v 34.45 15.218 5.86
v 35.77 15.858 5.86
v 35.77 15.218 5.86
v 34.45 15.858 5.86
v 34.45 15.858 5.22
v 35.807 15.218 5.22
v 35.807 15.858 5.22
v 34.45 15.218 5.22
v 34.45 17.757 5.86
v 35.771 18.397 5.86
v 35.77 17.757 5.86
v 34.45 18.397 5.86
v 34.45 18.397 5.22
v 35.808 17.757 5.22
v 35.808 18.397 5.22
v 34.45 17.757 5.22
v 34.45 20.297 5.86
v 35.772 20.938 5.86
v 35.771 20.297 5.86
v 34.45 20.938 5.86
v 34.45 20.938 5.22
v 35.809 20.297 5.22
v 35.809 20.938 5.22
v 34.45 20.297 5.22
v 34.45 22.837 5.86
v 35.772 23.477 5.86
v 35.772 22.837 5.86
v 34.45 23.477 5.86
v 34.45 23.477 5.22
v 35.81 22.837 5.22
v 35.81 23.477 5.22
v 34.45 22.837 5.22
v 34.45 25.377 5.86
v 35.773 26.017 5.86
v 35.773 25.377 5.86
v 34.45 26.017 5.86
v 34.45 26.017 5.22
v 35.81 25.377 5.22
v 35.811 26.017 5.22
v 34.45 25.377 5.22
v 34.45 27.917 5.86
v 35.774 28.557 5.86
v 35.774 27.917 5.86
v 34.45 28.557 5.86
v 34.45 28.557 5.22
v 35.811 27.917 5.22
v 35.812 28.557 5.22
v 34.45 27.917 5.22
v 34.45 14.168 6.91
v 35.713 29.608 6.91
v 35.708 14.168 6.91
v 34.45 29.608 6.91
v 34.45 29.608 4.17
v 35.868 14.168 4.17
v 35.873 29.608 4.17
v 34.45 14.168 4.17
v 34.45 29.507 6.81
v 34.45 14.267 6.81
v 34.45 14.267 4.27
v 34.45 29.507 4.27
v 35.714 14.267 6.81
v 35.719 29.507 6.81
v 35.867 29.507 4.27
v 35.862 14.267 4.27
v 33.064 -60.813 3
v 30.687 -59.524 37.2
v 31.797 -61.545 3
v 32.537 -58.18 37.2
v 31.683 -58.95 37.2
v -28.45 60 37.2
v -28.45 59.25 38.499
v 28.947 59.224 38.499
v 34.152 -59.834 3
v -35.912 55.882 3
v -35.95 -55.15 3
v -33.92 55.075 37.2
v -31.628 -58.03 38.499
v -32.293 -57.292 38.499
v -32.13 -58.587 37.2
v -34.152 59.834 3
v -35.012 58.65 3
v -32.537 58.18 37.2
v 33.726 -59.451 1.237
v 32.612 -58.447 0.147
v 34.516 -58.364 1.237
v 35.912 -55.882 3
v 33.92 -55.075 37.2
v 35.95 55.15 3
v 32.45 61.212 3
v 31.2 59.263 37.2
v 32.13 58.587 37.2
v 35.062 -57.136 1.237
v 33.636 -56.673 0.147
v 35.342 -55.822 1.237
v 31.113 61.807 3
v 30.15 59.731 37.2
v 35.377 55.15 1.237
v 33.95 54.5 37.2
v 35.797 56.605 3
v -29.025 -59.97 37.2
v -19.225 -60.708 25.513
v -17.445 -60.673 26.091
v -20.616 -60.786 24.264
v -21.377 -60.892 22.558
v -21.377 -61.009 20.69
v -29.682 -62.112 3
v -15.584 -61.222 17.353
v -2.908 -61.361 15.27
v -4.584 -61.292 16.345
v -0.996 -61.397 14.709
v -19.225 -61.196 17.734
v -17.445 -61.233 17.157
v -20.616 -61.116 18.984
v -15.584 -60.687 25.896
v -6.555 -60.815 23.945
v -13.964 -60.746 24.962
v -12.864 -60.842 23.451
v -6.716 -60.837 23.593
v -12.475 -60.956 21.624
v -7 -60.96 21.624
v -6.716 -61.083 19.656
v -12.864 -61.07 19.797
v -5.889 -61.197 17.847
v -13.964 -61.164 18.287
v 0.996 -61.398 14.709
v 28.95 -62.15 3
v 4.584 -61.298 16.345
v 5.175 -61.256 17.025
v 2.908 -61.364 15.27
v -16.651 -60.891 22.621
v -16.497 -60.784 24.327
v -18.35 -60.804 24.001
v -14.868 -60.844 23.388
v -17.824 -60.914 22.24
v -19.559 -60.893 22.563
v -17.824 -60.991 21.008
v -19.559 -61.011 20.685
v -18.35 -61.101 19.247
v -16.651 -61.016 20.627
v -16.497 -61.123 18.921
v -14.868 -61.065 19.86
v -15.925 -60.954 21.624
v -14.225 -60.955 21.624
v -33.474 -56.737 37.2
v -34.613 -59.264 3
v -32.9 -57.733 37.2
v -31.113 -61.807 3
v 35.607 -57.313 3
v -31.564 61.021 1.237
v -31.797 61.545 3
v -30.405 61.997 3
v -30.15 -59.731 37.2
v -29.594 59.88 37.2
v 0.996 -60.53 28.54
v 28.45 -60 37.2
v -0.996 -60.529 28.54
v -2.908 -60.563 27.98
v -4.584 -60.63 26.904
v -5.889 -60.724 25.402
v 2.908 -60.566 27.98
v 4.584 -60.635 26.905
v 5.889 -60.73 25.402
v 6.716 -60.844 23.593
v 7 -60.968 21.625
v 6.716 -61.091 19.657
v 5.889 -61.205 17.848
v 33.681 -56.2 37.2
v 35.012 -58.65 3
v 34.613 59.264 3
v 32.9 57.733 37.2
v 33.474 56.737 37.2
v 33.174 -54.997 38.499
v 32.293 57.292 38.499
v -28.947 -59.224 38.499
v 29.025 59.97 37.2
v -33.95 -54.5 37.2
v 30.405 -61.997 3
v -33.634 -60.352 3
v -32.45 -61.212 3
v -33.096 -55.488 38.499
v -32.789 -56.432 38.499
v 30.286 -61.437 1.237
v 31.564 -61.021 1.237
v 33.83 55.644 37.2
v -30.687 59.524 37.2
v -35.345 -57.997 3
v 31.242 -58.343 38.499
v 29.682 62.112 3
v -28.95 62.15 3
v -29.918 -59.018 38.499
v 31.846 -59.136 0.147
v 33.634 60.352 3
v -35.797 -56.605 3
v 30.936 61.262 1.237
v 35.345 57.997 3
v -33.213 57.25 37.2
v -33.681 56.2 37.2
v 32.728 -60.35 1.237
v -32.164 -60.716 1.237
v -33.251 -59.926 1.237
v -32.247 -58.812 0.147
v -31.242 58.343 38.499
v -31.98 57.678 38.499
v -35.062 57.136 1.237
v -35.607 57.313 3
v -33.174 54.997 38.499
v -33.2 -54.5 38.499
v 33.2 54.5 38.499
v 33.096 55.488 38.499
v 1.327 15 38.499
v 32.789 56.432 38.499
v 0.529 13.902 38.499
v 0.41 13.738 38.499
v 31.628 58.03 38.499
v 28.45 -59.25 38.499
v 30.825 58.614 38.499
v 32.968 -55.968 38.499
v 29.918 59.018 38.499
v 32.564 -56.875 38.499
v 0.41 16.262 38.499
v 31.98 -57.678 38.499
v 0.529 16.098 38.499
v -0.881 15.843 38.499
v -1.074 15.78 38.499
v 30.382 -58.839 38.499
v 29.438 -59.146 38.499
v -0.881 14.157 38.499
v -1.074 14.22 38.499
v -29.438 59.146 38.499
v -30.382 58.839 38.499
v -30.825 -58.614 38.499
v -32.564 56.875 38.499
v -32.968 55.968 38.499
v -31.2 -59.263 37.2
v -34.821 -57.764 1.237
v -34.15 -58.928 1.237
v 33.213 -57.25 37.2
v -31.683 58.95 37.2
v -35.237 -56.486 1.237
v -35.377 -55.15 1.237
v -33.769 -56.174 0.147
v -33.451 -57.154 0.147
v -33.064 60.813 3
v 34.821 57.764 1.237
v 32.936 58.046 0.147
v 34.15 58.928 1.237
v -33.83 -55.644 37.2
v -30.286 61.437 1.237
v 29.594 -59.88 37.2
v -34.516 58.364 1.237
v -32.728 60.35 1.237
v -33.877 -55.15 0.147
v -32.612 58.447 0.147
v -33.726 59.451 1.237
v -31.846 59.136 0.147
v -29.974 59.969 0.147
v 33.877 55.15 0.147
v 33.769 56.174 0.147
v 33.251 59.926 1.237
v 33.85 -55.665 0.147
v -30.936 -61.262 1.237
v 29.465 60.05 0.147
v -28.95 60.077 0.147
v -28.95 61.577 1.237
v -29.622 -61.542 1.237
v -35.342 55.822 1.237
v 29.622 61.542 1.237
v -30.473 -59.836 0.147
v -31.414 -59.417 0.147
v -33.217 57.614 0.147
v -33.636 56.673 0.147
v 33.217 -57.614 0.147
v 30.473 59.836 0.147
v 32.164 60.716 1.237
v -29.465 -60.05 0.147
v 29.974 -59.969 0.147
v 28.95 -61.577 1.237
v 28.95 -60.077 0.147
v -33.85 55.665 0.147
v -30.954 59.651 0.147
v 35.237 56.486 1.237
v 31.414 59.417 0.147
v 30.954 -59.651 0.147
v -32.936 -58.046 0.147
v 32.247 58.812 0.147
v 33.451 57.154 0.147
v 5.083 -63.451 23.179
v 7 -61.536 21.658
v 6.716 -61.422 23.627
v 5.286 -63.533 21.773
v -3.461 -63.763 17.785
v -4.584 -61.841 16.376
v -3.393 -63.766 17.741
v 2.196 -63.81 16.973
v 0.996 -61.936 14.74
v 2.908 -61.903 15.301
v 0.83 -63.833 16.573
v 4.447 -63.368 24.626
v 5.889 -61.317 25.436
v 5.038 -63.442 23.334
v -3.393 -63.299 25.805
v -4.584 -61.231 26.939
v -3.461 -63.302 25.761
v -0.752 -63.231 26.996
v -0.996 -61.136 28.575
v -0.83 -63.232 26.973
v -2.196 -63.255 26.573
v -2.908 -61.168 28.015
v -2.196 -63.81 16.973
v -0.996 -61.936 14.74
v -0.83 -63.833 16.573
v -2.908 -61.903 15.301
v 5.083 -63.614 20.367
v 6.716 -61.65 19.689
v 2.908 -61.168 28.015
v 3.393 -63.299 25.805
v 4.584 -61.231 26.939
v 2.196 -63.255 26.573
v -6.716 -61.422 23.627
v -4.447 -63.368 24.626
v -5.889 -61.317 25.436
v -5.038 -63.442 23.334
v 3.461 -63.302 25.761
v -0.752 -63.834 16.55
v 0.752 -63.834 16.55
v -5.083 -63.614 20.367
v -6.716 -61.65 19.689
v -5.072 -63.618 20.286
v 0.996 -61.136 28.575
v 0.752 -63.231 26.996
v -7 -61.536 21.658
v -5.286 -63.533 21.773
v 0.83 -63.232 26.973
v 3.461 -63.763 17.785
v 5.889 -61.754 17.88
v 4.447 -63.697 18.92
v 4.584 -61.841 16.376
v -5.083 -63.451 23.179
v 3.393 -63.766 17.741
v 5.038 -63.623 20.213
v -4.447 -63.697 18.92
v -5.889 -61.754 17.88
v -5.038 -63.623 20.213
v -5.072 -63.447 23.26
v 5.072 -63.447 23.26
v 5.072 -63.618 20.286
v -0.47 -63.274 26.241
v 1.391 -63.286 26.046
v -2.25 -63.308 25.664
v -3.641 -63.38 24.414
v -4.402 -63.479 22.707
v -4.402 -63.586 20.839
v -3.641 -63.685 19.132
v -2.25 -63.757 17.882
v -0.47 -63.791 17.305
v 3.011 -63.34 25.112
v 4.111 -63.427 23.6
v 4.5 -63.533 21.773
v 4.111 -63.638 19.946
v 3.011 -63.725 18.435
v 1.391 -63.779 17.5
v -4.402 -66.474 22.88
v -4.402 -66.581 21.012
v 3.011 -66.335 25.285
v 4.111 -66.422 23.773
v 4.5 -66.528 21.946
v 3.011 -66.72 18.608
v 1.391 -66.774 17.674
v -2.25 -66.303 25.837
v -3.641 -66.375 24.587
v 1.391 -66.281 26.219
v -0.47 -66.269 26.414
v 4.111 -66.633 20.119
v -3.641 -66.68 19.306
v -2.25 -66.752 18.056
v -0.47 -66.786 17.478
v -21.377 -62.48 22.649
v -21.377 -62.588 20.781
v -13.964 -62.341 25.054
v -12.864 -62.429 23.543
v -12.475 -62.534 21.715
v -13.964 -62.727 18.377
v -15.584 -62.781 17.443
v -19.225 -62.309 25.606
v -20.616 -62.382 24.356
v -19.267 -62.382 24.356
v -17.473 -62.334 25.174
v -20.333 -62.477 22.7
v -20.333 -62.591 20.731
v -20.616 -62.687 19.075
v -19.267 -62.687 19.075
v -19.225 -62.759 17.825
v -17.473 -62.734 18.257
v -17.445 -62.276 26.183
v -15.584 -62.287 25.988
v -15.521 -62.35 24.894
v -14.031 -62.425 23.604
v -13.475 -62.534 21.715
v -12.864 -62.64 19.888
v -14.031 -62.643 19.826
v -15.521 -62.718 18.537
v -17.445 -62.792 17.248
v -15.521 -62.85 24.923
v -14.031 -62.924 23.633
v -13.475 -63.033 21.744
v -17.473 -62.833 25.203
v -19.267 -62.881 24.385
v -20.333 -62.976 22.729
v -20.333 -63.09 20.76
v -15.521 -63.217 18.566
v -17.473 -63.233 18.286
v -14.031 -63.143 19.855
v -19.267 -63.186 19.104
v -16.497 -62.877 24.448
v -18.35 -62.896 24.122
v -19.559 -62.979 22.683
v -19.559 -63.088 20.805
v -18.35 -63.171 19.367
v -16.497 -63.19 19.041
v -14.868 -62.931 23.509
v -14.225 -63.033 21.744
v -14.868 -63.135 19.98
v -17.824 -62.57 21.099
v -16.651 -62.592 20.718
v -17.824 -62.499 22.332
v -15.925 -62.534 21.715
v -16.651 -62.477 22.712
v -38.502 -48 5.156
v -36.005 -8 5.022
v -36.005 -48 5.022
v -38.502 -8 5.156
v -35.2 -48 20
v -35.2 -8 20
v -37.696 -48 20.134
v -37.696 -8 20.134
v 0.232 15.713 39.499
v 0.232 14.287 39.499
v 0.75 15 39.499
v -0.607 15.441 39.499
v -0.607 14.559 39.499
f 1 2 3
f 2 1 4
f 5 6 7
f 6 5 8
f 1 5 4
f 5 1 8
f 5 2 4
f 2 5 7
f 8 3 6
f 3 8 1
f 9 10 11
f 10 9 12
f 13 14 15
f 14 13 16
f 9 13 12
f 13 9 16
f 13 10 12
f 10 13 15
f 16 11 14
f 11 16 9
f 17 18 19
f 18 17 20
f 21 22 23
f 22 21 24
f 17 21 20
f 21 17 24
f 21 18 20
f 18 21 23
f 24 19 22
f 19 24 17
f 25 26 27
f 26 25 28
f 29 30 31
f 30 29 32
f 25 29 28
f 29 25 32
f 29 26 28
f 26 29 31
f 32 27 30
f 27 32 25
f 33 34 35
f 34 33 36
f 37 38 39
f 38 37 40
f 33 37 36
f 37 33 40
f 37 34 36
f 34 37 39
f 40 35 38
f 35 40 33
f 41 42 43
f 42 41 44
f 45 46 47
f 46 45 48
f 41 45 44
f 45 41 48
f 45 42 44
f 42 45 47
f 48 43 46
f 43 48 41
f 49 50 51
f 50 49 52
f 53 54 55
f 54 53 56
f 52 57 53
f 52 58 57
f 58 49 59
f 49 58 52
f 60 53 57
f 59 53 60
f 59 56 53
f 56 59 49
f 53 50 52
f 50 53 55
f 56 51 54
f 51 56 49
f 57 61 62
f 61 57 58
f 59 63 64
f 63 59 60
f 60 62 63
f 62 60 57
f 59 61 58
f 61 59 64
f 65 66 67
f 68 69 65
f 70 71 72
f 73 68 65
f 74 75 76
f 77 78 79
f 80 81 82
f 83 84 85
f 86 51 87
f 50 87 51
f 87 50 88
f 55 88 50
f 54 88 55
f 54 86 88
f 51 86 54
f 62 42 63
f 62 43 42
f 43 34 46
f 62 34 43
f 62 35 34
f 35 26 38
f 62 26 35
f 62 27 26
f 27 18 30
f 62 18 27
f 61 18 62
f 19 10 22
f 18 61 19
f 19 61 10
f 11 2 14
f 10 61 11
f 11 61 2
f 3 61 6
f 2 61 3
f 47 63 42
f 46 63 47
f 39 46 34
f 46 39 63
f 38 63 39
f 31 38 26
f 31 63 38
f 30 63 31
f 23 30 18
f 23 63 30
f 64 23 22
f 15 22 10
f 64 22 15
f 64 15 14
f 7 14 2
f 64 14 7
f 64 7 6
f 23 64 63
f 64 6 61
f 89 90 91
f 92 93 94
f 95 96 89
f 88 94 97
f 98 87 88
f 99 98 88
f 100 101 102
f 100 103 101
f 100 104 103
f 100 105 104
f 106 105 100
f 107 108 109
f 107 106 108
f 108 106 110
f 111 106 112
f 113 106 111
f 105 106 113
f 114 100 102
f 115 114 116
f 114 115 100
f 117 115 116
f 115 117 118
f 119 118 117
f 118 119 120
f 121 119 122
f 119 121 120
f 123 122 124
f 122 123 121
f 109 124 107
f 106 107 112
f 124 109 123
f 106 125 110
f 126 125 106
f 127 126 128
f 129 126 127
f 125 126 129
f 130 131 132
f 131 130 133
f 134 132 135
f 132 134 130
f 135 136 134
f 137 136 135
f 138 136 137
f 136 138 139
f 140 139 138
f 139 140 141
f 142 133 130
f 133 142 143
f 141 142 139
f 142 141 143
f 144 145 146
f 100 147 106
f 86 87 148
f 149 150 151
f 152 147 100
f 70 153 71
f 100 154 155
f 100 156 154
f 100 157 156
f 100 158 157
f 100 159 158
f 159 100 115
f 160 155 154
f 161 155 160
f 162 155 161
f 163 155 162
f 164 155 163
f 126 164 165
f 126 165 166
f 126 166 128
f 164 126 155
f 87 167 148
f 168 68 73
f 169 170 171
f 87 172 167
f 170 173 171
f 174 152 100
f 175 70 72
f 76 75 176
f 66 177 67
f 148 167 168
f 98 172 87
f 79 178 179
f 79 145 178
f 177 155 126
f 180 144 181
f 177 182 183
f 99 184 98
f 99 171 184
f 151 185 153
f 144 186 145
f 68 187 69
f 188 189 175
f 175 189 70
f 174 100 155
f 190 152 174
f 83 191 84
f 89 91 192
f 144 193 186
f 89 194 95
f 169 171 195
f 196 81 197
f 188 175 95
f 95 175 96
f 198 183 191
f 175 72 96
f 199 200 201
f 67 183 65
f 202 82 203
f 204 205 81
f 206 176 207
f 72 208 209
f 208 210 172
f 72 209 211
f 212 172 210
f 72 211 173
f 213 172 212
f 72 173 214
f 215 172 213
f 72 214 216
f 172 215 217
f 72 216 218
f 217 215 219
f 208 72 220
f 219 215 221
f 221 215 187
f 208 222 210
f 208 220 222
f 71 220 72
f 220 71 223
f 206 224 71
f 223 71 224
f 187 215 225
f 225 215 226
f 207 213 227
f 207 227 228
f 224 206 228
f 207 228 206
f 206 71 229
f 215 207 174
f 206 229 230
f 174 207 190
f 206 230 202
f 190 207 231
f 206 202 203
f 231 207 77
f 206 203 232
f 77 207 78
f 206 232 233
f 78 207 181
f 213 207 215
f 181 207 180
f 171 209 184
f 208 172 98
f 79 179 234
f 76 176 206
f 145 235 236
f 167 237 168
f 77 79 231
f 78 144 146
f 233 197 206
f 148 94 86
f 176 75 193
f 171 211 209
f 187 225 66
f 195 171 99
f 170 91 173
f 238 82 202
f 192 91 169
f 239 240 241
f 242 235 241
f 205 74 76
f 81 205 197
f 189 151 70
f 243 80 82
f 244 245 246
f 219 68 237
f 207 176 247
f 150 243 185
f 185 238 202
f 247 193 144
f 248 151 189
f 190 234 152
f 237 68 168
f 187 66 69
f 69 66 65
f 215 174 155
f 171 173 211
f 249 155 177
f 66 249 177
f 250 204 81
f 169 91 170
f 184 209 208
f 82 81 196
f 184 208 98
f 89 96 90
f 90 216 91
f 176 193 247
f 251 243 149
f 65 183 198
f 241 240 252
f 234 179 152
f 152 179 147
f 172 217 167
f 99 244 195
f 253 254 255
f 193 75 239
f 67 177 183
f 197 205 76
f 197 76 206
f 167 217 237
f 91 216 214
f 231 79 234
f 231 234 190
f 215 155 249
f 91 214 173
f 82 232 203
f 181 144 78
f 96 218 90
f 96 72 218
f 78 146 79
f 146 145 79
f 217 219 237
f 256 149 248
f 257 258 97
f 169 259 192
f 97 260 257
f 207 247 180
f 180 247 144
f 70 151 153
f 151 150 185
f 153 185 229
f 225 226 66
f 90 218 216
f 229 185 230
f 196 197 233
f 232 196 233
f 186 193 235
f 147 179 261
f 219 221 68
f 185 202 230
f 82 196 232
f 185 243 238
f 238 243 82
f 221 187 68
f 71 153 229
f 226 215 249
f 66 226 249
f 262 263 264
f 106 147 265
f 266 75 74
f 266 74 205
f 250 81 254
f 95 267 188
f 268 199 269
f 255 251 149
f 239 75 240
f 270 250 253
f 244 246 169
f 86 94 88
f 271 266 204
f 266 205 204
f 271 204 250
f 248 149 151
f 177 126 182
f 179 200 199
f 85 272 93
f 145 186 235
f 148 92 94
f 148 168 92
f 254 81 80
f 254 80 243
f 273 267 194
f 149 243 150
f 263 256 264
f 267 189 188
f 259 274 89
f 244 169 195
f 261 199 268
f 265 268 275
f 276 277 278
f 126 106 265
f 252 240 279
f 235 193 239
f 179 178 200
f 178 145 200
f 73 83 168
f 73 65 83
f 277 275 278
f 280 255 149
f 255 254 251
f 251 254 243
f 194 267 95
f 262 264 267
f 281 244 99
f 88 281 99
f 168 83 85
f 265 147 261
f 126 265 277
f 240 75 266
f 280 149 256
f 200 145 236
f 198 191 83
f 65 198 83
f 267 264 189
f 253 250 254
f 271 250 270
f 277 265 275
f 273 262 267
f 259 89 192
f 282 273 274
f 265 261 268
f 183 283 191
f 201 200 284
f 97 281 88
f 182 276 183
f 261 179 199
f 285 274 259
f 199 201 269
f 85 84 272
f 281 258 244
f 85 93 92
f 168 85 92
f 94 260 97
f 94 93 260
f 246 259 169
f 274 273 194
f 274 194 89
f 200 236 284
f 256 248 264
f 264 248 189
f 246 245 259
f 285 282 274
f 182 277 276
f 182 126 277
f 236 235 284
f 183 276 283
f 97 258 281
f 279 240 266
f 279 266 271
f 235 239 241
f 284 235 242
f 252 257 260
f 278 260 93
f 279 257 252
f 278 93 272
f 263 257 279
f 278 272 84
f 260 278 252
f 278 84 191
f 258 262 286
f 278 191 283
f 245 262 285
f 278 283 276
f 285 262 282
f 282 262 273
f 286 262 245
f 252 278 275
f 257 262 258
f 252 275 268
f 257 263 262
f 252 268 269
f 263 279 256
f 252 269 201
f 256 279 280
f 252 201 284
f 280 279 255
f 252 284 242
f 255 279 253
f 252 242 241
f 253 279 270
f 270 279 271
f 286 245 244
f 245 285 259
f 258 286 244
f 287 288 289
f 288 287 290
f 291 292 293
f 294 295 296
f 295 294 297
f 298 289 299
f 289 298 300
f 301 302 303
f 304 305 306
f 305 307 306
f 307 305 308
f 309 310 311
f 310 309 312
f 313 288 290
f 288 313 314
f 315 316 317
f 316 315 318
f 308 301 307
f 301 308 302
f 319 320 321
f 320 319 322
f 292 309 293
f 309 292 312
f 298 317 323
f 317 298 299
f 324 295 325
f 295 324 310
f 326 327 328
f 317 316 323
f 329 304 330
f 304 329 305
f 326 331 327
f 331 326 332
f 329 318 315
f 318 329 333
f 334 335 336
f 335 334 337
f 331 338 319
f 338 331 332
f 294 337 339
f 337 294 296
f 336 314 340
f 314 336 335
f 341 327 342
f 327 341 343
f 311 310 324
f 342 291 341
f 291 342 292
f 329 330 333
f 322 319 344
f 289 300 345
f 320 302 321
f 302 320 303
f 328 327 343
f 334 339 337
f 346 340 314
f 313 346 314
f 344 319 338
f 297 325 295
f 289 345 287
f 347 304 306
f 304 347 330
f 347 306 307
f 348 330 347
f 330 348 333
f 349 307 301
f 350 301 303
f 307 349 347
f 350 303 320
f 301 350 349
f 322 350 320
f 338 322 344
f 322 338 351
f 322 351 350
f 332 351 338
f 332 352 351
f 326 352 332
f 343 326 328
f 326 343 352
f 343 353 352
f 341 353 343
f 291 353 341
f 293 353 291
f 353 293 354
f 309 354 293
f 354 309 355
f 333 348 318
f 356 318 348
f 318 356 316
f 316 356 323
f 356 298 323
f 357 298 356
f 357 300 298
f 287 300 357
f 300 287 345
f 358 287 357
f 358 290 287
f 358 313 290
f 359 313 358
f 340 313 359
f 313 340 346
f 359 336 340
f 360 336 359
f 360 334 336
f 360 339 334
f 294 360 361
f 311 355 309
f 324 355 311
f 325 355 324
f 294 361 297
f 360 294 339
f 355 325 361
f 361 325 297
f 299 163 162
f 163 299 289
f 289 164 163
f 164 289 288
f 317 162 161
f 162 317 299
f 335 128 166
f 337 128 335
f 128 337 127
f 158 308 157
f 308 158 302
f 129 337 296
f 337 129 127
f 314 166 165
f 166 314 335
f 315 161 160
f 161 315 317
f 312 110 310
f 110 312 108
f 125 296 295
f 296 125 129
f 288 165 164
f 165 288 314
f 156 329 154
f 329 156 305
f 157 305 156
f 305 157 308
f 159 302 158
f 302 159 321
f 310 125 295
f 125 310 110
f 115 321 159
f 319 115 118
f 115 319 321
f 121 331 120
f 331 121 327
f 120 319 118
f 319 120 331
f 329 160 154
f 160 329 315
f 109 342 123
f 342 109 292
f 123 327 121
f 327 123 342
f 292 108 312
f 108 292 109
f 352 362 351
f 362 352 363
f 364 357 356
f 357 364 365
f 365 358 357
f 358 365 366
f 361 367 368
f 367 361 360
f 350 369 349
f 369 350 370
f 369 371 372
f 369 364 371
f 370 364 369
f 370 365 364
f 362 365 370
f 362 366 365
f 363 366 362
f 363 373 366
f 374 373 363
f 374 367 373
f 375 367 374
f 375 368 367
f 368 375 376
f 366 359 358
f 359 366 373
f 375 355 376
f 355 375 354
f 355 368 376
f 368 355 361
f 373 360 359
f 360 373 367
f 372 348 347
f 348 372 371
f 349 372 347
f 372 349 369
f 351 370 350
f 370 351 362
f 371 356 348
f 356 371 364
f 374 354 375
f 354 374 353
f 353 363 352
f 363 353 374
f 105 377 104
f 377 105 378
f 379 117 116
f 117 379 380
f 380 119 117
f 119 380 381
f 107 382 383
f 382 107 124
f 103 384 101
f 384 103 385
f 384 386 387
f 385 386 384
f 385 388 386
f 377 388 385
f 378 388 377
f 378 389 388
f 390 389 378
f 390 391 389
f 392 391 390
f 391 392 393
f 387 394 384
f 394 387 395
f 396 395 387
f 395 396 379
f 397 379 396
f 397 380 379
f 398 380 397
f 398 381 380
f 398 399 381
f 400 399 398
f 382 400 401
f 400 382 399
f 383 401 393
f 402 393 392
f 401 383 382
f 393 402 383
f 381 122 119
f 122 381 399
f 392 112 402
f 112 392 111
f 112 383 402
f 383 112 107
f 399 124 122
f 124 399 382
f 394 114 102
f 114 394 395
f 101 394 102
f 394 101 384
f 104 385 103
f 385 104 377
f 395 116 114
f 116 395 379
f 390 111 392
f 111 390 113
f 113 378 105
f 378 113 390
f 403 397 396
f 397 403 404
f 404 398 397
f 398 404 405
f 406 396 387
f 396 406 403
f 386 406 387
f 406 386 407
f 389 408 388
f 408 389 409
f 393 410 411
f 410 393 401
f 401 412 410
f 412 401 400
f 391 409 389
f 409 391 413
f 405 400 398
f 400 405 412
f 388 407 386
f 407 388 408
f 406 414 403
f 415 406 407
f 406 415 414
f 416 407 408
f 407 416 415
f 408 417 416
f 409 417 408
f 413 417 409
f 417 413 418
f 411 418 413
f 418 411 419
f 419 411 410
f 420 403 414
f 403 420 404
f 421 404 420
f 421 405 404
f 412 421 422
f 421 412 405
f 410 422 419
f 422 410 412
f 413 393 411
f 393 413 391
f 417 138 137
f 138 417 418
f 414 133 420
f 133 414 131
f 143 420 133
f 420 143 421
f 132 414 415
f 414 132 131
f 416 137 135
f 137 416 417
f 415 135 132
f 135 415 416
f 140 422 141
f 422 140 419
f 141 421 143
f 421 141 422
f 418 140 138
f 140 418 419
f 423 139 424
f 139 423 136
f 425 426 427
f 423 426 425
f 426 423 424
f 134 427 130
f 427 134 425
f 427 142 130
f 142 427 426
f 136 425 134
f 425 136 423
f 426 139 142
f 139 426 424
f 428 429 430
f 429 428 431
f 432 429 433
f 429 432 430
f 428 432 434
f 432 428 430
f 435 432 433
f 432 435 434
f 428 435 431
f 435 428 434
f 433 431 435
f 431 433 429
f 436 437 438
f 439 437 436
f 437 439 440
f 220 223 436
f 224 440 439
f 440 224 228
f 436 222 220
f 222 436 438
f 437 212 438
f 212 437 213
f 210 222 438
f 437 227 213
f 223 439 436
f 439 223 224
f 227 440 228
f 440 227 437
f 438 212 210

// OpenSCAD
// Global resolution
//$fs = 0.1;  // Don't generate smaller facets than 0.1 mm
//$fa = 5;    // Don't generate larger angles than 5 degrees

edge_rounding = 1.5;
corner_radius = 4;

bottom_length = 124.3;
bottom_width = 71.9;
top_length = 120;
top_width = 67.9;
height = 37.2;

module corner(rCorner, rEdge) {
    // One corner of the box: a series of spheres rotated from 0° to 90°
    for (angle = [0 : $fa : 90]) {
        rotate(angle) translate([rCorner, 0, 0]) sphere(rEdge);
    }
}

module semiFace(dx, dy, rCorner, rEdge) {
    // Two corners
    translate([dx, dy, 0]) corner(rCorner, rEdge);
    translate([-dx, dy, 0]) rotate([0, 0, 90]) corner(rCorner, rEdge);
}

module face(length, width, rCorner, rEdge) {
    // Four corners with everything in between them.
    dx = width / 2 - rCorner - rEdge;
    dy = length / 2 - rCorner - rEdge;

    hull() {
        semiFace(dx, dy, rCorner, rEdge);
        rotate([0, 0, 180]) semiFace(dx, dy, rCorner, rEdge);
        //cube([dx + dx, dy + dy, 2 * rEdge], center=true);
    }
}

module box_z77() {
    color("DimGrey", 1.0) {
        hull() {
            face(bottom_length, bottom_width, corner_radius, 2 * edge_rounding);
            translate([0, 0, height - 2 * edge_rounding])
                face(top_length, top_width, corner_radius, edge_rounding);
        }
    }
}

module switch_button() {
    color("DimGrey") {
        // Base
        cylinder(h=1, r=7);
        // Slanted part
        translate([0, 0, 1]) {
            // Sliced cylinder
            difference() {
                cylinder(7, 7);
                translate([0, 0, 2]) cylinder(7, 7);
            }
        }
    }

    // Button
    color("Red") {
        cylinder(h=6, r=4.5);
    }
}

module plug() {
    difference() {
        union() {
            color("DimGrey") {
                cylinder(h=2, r=4.5);
            }
            color("LightGrey") {
                cylinder(h=2.5, r=3.5);
            }
        }
        cylinder(h=4, r=5.5/2);
    }
    color("LightGrey") {
        cylinder(h=2, r=2.1*0.5);
    }
}

module programmator_pin() {
    cube([5, 0.64, 0.64], center=true);
}

module programmator_connector() {
    for (pin = [0 : 1 : 5]) {
        translate([0, pin * 2.54, 0]) programmator_pin();
    }
    translate([0, 2.54 * 2.5, 0]) {
        difference() {
            cube([5, 2.54 * 6 + 0.2, 2.54 + 0.2], center=true);
            cube([5, 2.54 * 6, 2.54], center=true);
        }
    }
}

module battery_indicator() {
    translate([-2.5, 0, 0]) {
        color("Black")
            cube([2.5, 40, 15]);
        color("Red")
            translate([0.45, 8, 7.5]) rotate([0, 90, 0]) circle(4);
        color("Green")
            translate([0.45, 15, 2.5])
            rotate([90, 0, 90])
            polygon(points=[[0, 0], [20, 0], [20, 10]]);
    }
}

front_slope = 0.5 * (bottom_length - top_length) / height;
side_slope = 0.5 * (bottom_width - top_width) / height;

module station() {
    // Elevate slightly to align with z=0
    translate([0, 0, edge_rounding * 2]) {

        // Box with programmator connector
        difference() {
            box_z77();
            translate([bottom_width * 0.5 + 1, bottom_length * 0.125, 2.54]) {
                programmator_connector();
            }
        }

        // Position the button
        translate([0, -(top_length + bottom_length) / 4 + height * 0.25 * front_slope, height / 2]) {
            rotate([90 - atan(front_slope), 0, 0])
                switch_button();
        }

        // Position the plug
        translate([-top_width / 4, -(top_length + bottom_length) / 4 + height * 0.25 * front_slope, height / 2]) {
            rotate([90 - atan(front_slope), 0, 0])
                plug();
        }

        translate([-bottom_width / 2 + 0.75, -top_length / 2 + 3 * corner_radius, 17])
            mirror([0, 0, 1])
            rotate([0, -atan(side_slope), 0])
            battery_indicator();

        // Position the led
        color("Red") {
            translate([0, top_length * 0.125, height - 2]) {
                sphere(1.5);
            }
        }
    }
}

station();
